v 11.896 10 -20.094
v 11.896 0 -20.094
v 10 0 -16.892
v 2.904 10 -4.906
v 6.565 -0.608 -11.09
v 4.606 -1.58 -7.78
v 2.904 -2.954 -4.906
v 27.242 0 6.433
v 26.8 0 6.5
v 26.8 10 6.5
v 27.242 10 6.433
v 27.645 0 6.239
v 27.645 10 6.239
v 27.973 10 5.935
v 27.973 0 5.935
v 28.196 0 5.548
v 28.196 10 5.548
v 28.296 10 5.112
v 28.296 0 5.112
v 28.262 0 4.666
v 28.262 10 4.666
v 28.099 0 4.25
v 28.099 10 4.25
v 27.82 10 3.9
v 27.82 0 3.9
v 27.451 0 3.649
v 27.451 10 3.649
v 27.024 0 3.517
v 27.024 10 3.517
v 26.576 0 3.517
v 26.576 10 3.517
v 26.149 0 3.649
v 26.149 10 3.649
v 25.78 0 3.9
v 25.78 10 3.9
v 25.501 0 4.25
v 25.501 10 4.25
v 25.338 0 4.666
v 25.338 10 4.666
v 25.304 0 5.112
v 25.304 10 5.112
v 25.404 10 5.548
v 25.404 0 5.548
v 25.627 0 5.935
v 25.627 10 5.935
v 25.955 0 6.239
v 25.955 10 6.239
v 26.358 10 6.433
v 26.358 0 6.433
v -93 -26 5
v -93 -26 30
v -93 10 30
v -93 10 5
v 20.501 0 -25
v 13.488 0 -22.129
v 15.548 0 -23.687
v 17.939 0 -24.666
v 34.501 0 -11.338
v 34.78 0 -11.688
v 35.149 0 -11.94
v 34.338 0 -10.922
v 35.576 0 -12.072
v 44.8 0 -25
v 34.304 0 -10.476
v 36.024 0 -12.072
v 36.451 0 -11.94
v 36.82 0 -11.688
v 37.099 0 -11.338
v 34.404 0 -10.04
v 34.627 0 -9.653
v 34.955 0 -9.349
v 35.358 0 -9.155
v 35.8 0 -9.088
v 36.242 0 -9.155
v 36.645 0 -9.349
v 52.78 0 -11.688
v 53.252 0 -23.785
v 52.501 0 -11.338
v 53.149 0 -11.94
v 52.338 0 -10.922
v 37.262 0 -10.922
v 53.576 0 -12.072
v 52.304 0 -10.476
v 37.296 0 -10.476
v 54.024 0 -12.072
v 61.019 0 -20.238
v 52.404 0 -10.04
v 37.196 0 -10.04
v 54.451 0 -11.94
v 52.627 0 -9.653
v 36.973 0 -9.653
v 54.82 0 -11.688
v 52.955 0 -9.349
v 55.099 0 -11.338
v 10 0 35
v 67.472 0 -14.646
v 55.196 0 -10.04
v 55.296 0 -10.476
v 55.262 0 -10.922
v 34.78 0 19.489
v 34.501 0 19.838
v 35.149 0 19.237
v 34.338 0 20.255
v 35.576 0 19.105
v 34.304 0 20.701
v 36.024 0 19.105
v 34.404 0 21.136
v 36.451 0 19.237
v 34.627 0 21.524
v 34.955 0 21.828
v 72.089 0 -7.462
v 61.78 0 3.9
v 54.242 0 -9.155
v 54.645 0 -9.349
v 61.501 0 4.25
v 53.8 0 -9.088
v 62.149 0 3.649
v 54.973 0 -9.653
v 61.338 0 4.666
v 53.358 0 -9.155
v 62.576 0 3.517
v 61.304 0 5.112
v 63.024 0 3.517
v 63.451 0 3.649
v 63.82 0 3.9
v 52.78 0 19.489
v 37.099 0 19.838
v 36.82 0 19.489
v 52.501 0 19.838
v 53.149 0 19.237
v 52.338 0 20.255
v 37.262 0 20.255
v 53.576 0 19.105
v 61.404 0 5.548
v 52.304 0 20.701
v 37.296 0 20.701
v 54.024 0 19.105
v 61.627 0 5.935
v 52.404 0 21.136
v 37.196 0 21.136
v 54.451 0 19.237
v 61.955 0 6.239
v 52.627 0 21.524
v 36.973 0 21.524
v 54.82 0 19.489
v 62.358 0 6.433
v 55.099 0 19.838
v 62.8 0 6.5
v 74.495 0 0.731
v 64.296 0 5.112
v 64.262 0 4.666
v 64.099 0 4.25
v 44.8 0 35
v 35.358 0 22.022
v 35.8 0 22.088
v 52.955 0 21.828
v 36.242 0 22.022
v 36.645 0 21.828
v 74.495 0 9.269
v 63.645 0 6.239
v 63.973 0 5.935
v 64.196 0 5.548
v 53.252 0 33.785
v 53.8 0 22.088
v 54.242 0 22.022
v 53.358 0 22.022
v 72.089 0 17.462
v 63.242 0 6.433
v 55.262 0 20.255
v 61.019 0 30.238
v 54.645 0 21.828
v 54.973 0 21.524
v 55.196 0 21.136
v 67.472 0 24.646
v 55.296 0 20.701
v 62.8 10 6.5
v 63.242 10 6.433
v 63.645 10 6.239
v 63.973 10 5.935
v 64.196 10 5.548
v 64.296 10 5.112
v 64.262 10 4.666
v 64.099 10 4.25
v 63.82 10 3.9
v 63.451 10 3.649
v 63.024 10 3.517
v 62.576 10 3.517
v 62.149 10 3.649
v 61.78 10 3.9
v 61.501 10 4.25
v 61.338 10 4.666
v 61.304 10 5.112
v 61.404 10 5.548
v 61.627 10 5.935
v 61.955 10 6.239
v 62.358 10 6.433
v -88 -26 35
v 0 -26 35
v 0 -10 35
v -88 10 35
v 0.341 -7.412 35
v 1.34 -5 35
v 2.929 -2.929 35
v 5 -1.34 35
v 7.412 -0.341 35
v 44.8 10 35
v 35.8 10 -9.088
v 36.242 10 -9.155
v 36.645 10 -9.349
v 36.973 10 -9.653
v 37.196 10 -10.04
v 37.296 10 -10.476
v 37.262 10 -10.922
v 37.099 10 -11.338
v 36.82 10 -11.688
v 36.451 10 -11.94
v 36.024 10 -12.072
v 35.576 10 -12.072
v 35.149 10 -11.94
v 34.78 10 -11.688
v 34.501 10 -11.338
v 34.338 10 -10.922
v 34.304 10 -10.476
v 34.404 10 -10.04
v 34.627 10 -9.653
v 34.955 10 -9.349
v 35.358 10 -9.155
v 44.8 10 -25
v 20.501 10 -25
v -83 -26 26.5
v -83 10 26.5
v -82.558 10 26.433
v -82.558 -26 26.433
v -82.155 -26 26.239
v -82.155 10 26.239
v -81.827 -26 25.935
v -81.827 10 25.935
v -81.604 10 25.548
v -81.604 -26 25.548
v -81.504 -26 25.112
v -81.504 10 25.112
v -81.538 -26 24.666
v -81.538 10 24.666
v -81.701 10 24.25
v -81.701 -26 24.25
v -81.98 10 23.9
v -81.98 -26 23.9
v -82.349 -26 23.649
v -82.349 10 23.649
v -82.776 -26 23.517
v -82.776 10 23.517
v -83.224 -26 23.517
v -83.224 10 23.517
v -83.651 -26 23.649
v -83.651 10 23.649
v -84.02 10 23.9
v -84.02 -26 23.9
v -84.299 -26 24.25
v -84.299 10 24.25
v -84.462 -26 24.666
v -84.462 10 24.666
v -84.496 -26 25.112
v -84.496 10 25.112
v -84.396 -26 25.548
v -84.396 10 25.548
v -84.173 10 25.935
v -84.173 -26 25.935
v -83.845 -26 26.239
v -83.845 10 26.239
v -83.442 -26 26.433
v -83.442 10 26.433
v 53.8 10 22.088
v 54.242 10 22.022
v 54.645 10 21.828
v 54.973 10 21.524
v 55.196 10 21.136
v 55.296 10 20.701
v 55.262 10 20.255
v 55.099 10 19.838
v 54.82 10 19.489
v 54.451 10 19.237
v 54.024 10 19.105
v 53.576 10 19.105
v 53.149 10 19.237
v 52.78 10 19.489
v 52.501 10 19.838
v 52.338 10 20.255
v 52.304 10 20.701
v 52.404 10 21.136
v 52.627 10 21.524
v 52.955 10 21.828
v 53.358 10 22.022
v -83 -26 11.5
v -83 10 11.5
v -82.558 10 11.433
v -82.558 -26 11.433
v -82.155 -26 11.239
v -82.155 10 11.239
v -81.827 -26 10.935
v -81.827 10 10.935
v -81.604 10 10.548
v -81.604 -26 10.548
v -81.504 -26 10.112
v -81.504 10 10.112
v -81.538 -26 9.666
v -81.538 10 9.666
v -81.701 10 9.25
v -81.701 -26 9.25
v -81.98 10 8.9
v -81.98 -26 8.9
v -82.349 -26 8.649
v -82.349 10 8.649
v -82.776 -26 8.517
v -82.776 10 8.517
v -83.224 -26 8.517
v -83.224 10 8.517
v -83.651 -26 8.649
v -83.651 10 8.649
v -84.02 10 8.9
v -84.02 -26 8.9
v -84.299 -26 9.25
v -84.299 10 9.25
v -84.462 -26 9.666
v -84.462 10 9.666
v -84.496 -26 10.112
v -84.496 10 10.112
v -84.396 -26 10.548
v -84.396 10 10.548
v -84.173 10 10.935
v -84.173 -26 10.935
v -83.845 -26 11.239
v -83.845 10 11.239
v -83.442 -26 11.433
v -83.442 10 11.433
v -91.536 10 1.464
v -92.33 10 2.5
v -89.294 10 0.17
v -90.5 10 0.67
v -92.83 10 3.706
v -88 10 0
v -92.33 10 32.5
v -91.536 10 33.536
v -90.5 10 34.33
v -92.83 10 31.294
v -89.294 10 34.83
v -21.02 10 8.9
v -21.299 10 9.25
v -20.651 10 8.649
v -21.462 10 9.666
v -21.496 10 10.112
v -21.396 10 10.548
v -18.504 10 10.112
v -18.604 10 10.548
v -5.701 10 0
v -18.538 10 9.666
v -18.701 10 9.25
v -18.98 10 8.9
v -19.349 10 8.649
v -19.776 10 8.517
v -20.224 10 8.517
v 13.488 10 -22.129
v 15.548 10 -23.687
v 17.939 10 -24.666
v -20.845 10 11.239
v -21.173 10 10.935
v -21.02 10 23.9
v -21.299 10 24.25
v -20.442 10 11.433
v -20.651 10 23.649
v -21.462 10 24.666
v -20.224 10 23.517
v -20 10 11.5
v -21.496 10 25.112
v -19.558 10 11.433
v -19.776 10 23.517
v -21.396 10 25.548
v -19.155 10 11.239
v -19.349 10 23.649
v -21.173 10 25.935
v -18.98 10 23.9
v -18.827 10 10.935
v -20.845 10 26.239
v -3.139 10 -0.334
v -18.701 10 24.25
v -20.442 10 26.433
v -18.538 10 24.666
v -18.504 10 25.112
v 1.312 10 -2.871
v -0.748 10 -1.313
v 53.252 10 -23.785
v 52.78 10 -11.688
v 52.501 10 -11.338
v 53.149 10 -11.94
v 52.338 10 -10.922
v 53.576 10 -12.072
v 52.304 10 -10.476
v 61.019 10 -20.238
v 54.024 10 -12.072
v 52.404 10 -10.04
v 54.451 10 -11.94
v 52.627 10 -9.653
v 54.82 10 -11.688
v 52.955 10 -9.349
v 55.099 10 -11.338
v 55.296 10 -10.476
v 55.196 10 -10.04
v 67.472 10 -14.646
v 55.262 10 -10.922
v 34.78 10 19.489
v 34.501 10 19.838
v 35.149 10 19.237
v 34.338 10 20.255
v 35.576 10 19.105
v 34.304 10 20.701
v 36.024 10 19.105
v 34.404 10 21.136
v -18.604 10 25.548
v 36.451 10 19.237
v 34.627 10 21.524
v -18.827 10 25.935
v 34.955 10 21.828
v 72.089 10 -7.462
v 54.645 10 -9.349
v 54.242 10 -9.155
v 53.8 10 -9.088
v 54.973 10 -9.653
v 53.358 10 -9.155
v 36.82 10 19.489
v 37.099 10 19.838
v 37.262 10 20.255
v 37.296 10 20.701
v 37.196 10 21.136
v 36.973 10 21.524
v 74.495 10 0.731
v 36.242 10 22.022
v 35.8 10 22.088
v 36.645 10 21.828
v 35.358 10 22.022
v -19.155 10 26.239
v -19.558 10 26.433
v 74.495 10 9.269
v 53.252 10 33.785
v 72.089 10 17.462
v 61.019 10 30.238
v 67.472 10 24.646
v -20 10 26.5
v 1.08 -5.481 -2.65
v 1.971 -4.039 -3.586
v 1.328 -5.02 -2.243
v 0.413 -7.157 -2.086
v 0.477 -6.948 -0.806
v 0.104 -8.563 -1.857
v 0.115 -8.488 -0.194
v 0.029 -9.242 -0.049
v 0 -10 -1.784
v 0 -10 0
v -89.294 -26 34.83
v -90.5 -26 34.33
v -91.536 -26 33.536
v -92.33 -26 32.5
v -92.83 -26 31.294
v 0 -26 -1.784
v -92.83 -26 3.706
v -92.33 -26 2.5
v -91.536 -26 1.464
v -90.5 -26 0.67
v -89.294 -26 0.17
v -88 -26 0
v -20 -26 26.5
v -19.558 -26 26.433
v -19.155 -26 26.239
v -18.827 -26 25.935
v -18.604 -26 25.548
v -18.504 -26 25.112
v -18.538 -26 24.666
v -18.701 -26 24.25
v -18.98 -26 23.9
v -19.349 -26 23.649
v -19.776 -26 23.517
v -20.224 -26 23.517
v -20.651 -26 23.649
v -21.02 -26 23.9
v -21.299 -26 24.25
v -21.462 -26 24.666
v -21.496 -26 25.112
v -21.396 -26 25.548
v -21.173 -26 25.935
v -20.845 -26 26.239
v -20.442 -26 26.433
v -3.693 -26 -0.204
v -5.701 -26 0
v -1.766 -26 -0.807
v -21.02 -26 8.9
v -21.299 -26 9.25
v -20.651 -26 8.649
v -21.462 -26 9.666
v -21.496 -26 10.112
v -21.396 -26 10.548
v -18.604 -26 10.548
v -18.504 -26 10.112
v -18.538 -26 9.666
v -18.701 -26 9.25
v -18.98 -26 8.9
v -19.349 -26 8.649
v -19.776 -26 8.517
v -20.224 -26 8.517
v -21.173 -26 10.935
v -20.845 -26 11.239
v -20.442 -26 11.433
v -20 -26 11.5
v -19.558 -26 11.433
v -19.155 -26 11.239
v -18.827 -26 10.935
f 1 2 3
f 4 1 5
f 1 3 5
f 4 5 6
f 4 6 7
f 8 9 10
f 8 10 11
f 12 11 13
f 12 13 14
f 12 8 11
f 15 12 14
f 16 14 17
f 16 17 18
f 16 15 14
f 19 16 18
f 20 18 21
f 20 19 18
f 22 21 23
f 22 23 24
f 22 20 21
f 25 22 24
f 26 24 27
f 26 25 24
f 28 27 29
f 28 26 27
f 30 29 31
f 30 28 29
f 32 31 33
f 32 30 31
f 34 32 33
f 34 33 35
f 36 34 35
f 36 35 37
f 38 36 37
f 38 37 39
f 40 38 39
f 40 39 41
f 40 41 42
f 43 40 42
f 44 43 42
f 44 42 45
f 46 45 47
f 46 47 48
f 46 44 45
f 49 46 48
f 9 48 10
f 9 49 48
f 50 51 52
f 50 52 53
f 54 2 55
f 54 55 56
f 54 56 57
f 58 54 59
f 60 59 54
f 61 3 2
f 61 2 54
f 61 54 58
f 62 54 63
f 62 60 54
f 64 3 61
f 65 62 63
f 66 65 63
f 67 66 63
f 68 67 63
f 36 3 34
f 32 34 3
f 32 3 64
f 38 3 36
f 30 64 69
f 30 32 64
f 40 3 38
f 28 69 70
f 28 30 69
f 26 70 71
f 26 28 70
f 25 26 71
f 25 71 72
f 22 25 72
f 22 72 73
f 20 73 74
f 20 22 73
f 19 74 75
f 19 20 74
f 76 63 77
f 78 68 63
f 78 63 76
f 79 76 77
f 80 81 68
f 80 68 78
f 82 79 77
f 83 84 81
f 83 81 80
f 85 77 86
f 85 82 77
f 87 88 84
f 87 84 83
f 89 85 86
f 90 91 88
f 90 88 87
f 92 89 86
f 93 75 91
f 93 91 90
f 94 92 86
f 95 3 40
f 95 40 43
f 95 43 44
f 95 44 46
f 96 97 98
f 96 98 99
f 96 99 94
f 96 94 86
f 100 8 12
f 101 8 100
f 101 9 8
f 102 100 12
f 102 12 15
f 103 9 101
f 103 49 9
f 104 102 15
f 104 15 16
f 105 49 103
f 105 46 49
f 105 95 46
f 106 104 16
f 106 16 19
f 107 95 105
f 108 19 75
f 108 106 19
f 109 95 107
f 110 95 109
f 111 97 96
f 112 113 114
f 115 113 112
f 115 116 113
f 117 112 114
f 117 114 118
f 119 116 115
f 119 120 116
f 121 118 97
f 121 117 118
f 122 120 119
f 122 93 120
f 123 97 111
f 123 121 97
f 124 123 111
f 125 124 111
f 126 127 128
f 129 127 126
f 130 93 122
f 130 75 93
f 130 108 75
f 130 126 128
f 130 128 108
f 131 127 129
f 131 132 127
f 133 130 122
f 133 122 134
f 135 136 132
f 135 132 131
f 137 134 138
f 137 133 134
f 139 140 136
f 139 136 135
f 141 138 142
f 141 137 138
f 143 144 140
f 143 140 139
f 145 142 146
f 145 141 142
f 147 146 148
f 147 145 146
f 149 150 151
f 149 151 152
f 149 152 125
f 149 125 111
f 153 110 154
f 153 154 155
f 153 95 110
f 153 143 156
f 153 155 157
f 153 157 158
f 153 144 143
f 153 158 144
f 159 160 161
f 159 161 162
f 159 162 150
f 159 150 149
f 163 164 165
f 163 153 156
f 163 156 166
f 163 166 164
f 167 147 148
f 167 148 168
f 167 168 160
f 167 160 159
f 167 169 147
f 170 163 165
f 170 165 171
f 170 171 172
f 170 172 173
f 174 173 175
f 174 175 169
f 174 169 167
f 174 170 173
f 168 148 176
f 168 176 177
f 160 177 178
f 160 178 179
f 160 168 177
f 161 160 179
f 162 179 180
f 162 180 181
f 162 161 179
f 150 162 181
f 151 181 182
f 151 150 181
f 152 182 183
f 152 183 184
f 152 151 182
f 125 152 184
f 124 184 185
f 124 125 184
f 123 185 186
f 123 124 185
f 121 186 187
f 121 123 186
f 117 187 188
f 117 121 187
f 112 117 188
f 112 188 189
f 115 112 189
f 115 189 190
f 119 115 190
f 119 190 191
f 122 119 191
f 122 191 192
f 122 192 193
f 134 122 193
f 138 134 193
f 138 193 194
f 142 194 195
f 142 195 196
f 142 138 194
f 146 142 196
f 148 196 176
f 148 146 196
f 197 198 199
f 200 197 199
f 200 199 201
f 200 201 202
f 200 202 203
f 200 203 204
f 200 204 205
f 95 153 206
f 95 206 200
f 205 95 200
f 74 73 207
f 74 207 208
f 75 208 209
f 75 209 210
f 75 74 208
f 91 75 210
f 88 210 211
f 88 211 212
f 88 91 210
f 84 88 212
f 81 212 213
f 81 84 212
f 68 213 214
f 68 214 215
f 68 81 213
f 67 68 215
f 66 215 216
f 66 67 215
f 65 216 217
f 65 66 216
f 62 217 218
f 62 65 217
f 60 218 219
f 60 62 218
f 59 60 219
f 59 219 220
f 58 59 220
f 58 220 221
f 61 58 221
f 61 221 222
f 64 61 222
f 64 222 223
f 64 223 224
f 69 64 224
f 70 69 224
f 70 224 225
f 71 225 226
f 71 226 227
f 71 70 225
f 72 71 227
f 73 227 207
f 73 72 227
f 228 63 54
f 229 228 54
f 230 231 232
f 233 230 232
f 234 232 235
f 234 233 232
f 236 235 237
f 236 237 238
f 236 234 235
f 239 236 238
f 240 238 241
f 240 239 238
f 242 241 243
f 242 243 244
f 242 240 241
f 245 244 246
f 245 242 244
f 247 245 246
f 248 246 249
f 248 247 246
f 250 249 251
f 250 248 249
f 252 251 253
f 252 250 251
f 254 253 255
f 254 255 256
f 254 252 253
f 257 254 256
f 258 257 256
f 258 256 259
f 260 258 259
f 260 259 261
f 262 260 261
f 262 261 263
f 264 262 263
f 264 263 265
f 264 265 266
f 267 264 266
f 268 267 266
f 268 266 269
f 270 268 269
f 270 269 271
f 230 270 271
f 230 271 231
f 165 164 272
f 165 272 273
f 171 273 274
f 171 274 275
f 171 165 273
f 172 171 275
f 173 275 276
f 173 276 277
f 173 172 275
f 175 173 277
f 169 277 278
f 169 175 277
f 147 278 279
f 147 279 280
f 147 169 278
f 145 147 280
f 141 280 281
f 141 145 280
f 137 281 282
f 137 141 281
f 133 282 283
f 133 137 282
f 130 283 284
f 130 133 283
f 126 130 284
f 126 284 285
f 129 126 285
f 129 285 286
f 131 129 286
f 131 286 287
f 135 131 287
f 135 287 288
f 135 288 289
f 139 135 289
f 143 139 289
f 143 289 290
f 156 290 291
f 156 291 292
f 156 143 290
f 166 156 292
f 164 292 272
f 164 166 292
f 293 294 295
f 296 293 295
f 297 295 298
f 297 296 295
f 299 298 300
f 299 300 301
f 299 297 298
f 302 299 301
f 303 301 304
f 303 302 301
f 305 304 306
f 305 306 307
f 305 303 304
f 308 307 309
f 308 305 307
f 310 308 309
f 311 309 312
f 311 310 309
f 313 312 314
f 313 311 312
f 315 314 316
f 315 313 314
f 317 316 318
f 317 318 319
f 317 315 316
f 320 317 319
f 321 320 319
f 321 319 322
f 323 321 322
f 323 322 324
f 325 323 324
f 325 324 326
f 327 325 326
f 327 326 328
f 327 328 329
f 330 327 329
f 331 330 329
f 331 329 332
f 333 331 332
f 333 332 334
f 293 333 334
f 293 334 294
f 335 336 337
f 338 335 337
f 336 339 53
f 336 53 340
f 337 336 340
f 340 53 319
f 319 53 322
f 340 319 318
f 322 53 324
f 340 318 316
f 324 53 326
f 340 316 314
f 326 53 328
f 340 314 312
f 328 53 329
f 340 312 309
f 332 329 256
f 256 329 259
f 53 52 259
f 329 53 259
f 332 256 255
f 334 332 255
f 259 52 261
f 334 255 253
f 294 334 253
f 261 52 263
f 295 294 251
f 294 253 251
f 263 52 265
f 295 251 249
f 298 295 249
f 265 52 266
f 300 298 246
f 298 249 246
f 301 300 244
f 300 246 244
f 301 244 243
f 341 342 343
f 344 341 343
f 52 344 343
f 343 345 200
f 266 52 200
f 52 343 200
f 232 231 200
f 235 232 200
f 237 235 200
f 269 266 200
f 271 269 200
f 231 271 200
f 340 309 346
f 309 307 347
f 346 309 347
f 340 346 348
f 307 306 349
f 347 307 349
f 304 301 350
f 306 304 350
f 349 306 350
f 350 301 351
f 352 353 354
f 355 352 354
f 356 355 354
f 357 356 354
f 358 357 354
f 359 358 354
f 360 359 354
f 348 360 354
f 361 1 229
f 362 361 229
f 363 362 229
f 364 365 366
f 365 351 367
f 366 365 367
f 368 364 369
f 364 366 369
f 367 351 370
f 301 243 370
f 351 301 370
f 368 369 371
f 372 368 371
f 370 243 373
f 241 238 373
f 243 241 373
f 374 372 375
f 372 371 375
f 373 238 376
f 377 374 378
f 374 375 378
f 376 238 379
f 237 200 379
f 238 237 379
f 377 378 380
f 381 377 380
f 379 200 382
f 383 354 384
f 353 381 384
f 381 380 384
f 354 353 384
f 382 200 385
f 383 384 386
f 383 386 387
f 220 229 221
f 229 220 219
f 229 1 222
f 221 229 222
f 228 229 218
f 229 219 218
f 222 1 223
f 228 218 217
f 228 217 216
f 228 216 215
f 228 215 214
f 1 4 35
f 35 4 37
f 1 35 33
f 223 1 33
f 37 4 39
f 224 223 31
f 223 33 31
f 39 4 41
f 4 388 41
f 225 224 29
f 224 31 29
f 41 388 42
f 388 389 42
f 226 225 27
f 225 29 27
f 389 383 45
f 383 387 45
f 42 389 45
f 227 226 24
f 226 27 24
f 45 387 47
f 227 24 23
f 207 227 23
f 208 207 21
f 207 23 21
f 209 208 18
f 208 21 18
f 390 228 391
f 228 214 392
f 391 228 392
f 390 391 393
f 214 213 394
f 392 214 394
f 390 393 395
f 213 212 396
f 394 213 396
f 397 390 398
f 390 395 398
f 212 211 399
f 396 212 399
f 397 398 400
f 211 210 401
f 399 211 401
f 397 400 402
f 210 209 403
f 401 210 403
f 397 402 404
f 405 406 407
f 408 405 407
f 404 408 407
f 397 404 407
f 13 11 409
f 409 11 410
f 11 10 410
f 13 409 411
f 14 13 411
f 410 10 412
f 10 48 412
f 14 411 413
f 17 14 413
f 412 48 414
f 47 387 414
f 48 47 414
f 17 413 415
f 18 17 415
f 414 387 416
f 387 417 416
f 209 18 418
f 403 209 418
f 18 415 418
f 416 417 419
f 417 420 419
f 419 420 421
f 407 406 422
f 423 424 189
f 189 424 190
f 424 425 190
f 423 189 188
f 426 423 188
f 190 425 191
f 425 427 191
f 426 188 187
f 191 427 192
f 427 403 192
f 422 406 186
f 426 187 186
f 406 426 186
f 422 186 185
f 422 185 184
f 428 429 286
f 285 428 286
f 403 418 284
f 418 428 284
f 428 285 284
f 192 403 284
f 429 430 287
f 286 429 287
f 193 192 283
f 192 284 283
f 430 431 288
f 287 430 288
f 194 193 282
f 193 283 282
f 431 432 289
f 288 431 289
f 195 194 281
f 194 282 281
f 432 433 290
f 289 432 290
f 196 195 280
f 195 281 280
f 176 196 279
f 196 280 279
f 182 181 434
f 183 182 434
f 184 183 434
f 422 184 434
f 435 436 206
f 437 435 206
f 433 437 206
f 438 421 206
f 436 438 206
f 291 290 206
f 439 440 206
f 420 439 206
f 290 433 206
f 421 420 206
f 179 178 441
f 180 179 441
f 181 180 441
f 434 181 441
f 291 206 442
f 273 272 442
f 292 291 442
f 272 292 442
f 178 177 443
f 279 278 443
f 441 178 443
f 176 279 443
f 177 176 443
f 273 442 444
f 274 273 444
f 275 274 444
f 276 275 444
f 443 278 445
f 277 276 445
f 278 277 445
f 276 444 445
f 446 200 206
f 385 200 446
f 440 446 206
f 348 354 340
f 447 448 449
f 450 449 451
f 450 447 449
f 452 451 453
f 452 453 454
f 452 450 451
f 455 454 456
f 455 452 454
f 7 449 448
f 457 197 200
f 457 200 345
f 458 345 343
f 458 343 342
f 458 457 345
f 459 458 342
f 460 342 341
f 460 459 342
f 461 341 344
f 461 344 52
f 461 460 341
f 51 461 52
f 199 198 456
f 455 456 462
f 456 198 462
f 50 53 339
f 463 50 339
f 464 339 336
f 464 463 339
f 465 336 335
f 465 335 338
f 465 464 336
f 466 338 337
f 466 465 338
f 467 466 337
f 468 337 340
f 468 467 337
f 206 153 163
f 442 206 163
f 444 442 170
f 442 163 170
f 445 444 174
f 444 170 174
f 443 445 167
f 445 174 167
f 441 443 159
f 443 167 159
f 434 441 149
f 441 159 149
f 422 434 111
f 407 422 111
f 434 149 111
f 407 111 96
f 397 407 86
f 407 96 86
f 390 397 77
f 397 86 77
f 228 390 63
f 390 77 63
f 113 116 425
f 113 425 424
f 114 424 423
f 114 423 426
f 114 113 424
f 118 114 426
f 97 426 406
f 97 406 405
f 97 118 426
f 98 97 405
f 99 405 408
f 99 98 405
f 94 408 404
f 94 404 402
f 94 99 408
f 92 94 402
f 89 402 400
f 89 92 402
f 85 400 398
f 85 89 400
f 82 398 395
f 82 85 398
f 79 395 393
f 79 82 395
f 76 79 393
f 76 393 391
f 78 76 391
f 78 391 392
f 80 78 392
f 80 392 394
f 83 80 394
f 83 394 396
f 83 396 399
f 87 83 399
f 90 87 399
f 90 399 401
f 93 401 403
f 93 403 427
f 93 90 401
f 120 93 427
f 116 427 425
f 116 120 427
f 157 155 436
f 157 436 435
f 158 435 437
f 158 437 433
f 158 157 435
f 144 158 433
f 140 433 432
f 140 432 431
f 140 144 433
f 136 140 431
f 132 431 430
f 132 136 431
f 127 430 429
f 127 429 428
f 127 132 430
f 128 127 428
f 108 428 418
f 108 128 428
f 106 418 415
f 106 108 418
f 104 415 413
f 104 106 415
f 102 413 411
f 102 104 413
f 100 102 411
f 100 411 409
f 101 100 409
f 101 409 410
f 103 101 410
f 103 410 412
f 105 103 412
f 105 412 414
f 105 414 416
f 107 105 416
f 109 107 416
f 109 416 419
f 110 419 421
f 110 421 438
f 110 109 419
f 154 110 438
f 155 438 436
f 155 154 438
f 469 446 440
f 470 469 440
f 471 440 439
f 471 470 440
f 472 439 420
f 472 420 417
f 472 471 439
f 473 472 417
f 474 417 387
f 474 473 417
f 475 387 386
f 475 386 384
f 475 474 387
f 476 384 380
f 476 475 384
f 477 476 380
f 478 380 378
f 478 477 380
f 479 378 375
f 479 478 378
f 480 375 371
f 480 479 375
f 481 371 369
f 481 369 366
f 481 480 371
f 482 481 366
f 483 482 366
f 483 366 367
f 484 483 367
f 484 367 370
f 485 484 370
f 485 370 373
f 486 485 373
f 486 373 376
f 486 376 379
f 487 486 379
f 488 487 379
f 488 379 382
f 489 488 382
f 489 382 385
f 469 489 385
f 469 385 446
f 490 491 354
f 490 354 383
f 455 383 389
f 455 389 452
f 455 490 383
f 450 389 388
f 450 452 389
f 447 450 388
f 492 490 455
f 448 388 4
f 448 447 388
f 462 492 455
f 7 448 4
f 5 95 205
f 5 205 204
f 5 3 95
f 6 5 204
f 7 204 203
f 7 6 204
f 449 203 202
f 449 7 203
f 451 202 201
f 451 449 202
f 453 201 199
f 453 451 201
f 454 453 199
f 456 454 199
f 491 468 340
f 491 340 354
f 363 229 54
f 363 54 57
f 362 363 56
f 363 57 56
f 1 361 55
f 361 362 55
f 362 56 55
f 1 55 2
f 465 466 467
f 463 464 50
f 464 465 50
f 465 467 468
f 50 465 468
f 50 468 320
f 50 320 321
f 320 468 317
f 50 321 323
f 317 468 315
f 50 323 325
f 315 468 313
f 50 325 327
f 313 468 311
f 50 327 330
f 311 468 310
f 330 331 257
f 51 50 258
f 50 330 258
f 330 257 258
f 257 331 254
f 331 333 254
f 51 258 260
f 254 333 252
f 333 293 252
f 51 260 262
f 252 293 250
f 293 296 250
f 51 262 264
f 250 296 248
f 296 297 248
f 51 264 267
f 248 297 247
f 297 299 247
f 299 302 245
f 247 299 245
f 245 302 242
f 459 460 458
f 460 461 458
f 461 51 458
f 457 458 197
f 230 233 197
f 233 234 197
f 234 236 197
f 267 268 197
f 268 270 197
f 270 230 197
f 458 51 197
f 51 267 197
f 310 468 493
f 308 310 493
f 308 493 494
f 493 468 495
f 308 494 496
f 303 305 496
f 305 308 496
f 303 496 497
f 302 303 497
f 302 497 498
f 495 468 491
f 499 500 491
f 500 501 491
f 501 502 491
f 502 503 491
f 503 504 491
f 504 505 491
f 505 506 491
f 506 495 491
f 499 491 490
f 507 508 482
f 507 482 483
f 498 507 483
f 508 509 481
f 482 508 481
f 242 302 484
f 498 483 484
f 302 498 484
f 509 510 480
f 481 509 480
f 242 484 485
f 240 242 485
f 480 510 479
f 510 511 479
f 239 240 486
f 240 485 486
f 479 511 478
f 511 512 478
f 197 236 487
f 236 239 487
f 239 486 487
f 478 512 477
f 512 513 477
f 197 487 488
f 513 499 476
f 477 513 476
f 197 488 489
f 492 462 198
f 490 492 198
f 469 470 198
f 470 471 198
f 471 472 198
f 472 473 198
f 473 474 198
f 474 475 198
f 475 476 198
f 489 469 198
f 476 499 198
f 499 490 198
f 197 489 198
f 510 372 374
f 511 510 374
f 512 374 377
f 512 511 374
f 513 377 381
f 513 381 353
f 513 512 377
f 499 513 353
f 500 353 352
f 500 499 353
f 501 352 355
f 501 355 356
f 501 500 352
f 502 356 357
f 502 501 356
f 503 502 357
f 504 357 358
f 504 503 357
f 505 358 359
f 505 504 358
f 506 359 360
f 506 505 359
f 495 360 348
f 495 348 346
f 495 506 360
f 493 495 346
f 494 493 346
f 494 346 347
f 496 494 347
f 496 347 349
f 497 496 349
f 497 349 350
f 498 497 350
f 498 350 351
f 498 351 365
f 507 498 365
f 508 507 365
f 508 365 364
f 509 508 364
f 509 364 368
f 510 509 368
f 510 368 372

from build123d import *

# Parameters (mm, degrees)
SKETCH1_R           = 1.5
BOSS_EXTRUDE2_DEPTH = 10
BOSS_EXTRUDE3_START = -26
SKETCH1_3_R         = 1.5
BOSS_EXTRUDE3_DEPTH = 26
FILLET1_R           = 10


with BuildPart() as part:
    # Sketch1 → Boss-Extrude2 (new body)
    # profile 1 of 2: a face of its own
    with BuildSketch(Plane(origin=(0, 0, 0), x_dir=(-1, 0, 0), z_dir=(0, 1, 0))):
        with BuildLine():
            Line((0, 35), (-44.8, 35))
            ThreePointArc((-44.8, 35), (-74.8, 5), (-44.8, -25))
            Line((-44.8, -25), (-14.8, -25))
            Line((-14.8, -25), (0, 0))
            Line((0, 0), (0, 35))
        make_face()
        with Locations(Location((-53.8, -10.588457268, 0), (0, 0, 90))):
            Circle(SKETCH1_R, mode=Mode.SUBTRACT)
        with Locations(Location((-35.8, -10.588457268, 0), (0, 0, 90))):
            Circle(SKETCH1_R, mode=Mode.SUBTRACT)
        with Locations(Location((-26.8, 5, 0), (0, 0, 90))):
            Circle(SKETCH1_R, mode=Mode.SUBTRACT)
        with Locations(Location((-35.8, 20.588457268, 0), (0, 0, 90))):
            Circle(SKETCH1_R, mode=Mode.SUBTRACT)
        with Locations(Location((-53.8, 20.588457268, 0), (0, 0, 90))):
            Circle(SKETCH1_R, mode=Mode.SUBTRACT)
        with Locations(Location((-62.8, 5, 0), (0, 0, 90))):
            Circle(SKETCH1_R, mode=Mode.SUBTRACT)
    # profile 2 of 2: a face of its own
    with BuildSketch(Plane(origin=(0, 0, 0), x_dir=(-1, 0, 0), z_dir=(0, 1, 0))):
        with BuildLine():
            ThreePointArc((88, 35), (91.535533906, 33.535533906), (93, 30))
            Line((93, 30), (93, 5))
            ThreePointArc((93, 5), (91.535533906, 1.464466094), (88, 0))
            Line((88, 0), (0, 0))
            Line((0, 0), (0, 35))
            Line((0, 35), (88, 35))
        make_face()
        with Locations(Location((20, 10, 0), (0, 0, 90))):
            Circle(SKETCH1_R, mode=Mode.SUBTRACT)
        with Locations(Location((83, 10, 0), (0, 0, 90))):
            Circle(SKETCH1_R, mode=Mode.SUBTRACT)
        with Locations(Location((83, 25, 0), (0, 0, 90))):
            Circle(SKETCH1_R, mode=Mode.SUBTRACT)
        with Locations(Location((20, 25, 0), (0, 0, 90))):
            Circle(SKETCH1_R, mode=Mode.SUBTRACT)
    extrude(amount=BOSS_EXTRUDE2_DEPTH)

    # Sketch1<3> → Boss-Extrude3 (add)
    with BuildSketch(Plane(origin=(0, 0, 0), x_dir=(-1, 0, 0), z_dir=(0, 1, 0)).offset(BOSS_EXTRUDE3_START)):
        with BuildLine():
            ThreePointArc((88, 35), (91.535533906, 33.535533906), (93, 30))
            Line((93, 30), (93, 5))
            ThreePointArc((93, 5), (91.535533906, 1.464466094), (88, 0))
            Line((88, 0), (0, 0))
            Line((0, 0), (0, 35))
            Line((0, 35), (88, 35))
        make_face()
        with Locations(Location((20, 10, 0), (0, 0, 90))):
            Circle(SKETCH1_3_R, mode=Mode.SUBTRACT)
        with Locations(Location((83, 10, 0), (0, 0, 90))):
            Circle(SKETCH1_3_R, mode=Mode.SUBTRACT)
        with Locations(Location((83, 25, 0), (0, 0, 90))):
            Circle(SKETCH1_3_R, mode=Mode.SUBTRACT)
        with Locations(Location((20, 25, 0), (0, 0, 90))):
            Circle(SKETCH1_3_R, mode=Mode.SUBTRACT)
    extrude(amount=BOSS_EXTRUDE3_DEPTH)

    # Fillet1
    # the kernel refuses this fillet: 10 mm, written as the material it adds along each edge
    with BuildSketch(Plane(origin=(0, 0, -60), x_dir=(0, -1, 0), z_dir=(0, 0, 1))) as fillet1_piece_1_section:
        with BuildLine():
            CenterArc((FILLET1_R, FILLET1_R), FILLET1_R, 180, 90)
            Line((0, FILLET1_R), (-FILLET1_R * 0.02, FILLET1_R))
            Line((-FILLET1_R * 0.02, FILLET1_R), (-FILLET1_R * 0.02, -FILLET1_R * 0.02))
            Line((-FILLET1_R * 0.02, -FILLET1_R * 0.02), (FILLET1_R, -FILLET1_R * 0.02))
            Line((FILLET1_R, -FILLET1_R * 0.02), (FILLET1_R, 0))
        make_face()
    fillet1_piece_1 = extrude(amount=95, mode=Mode.PRIVATE)
    fillet1_piece_1 = split(fillet1_piece_1, bisect_by=Plane(origin=(4.301180518, -1.064725153, 0), z_dir=(0, 0, -1)), keep=Keep.TOP, mode=Mode.PRIVATE)
    fillet1_piece_1 = split(fillet1_piece_1, bisect_by=Plane(origin=(2.708698038, -1.064725153, -4.575503443), z_dir=(0.8605150974154716, 0, 0.509424937669959)), keep=Keep.TOP, mode=Mode.PRIVATE)
    add(fillet1_piece_1)
    with BuildSketch(Plane(origin=(0, 0, 0), x_dir=(0, -1, 0), z_dir=(0, 0, 1))) as fillet1_piece_2_section:
        with BuildLine():
            CenterArc((FILLET1_R, FILLET1_R), FILLET1_R, 180, 90)
            Line((0, FILLET1_R), (-FILLET1_R * 0.02, FILLET1_R))
            Line((-FILLET1_R * 0.02, FILLET1_R), (-FILLET1_R * 0.02, -FILLET1_R * 0.02))
            Line((-FILLET1_R * 0.02, -FILLET1_R * 0.02), (FILLET1_R, -FILLET1_R * 0.02))
            Line((FILLET1_R, -FILLET1_R * 0.02), (FILLET1_R, 0))
        make_face()
    fillet1_piece_2 = extrude(amount=35, mode=Mode.PRIVATE)
    fillet1_piece_2 = split(fillet1_piece_2, bisect_by=Plane(origin=(-7.086614588, -2.262932977, 11.97063275), z_dir=(0.8605150974154716, 0, 0.509424937669959)), keep=Keep.TOP, mode=Mode.PRIVATE)
    add(fillet1_piece_2)
    with BuildSketch(Plane(origin=(0, 0, 0), x_dir=(0, -1, 0), z_dir=(0, 0, 1))) as fillet1_piece_3_section:
        with BuildLine():
            CenterArc((FILLET1_R, FILLET1_R), FILLET1_R, 180, 90)
            Line((0, FILLET1_R), (-FILLET1_R * 0.02, FILLET1_R))
            Line((-FILLET1_R * 0.02, FILLET1_R), (-FILLET1_R * 0.02, -FILLET1_R * 0.02))
            Line((-FILLET1_R * 0.02, -FILLET1_R * 0.02), (FILLET1_R, -FILLET1_R * 0.02))
            Line((FILLET1_R, -FILLET1_R * 0.02), (FILLET1_R, 0))
        make_face()
    fillet1_piece_3 = extrude(amount=35, mode=Mode.PRIVATE)
    fillet1_piece_3 = split(fillet1_piece_3, bisect_by=Plane(origin=(-0.083967584, -4.9, 0.141837136), z_dir=(-0.8605150974154716, 0, -0.509424937669959)), keep=Keep.TOP, mode=Mode.PRIVATE)
    add(fillet1_piece_3)
    with BuildSketch(Plane(origin=(0, -34.205679631, 0), x_dir=(-1, 0, 0), z_dir=(0, 1, 0))) as fillet1_piece_4_section:
        with BuildLine():
            CenterArc((FILLET1_R * 0.570094660516, -FILLET1_R), FILLET1_R, 90, 59.374467281)
            Line((-FILLET1_R * 0.290420436899, -FILLET1_R * 0.49057506233), (-FILLET1_R * 0.307630738848, -FILLET1_R * 0.480386563577))
            Line((-FILLET1_R * 0.307630738848, -FILLET1_R * 0.480386563577), (-FILLET1_R * 0.0114018932103, FILLET1_R * 0.02))
            Line((-FILLET1_R * 0.0114018932103, FILLET1_R * 0.02), (FILLET1_R * 0.570094660516, FILLET1_R * 0.02))
            Line((FILLET1_R * 0.570094660516, FILLET1_R * 0.02), (FILLET1_R * 0.570094660516, 0))
        make_face()
    fillet1_piece_4 = extrude(amount=44.205679631, mode=Mode.PRIVATE)
    fillet1_piece_4 = split(fillet1_piece_4, bisect_by=Plane(origin=(0, -13, -0.363733484), z_dir=(-1, 0, 0)), keep=Keep.TOP, mode=Mode.PRIVATE)
    fillet1_piece_4 = split(fillet1_piece_4, bisect_by=Plane(origin=(-1.77482193, -26, -0.363733484), z_dir=(0, 1, 0)), keep=Keep.TOP, mode=Mode.PRIVATE)
    fillet1_piece_4 = split(fillet1_piece_4, bisect_by=Plane(origin=(-1.77482193, 0, -0.363733484), z_dir=(0, -1, 0)), keep=Keep.TOP, mode=Mode.PRIVATE)
    add(fillet1_piece_4)
    with BuildSketch(Plane(origin=(0, 0, 0), x_dir=(-1, 0, 0), z_dir=(0, 1, 0))) as fillet1_piece_5_section:
        with BuildLine():
            CenterArc((FILLET1_R * 0.570094660516, -FILLET1_R), FILLET1_R, 90, 59.374467281)
            Line((-FILLET1_R * 0.290420436899, -FILLET1_R * 0.49057506233), (-FILLET1_R * 0.307630738848, -FILLET1_R * 0.480386563577))
            Line((-FILLET1_R * 0.307630738848, -FILLET1_R * 0.480386563577), (-FILLET1_R * 0.0114018932103, FILLET1_R * 0.02))
            Line((-FILLET1_R * 0.0114018932103, FILLET1_R * 0.02), (FILLET1_R * 0.570094660516, FILLET1_R * 0.02))
            Line((FILLET1_R * 0.570094660516, FILLET1_R * 0.02), (FILLET1_R * 0.570094660516, 0))
        make_face()
    fillet1_piece_5 = extrude(amount=10, mode=Mode.PRIVATE)
    fillet1_piece_5 = split(fillet1_piece_5, bisect_by=Plane(origin=(0, 5, -0.363733484), z_dir=(-1, 0, 0)), keep=Keep.TOP, mode=Mode.PRIVATE)
    add(fillet1_piece_5)
    with BuildSketch(Plane(origin=(0, 0, 0), x_dir=(-1, 0, 0), z_dir=(0, 1, 0))) as fillet1_piece_6_section:
        with BuildLine():
            CenterArc((FILLET1_R * 0.570094660516, -FILLET1_R), FILLET1_R, 90, 59.374467281)
            Line((-FILLET1_R * 0.290420436899, -FILLET1_R * 0.49057506233), (-FILLET1_R * 0.307630738848, -FILLET1_R * 0.480386563577))
            Line((-FILLET1_R * 0.307630738848, -FILLET1_R * 0.480386563577), (-FILLET1_R * 0.0114018932103, FILLET1_R * 0.02))
            Line((-FILLET1_R * 0.0114018932103, FILLET1_R * 0.02), (FILLET1_R * 0.570094660516, FILLET1_R * 0.02))
            Line((FILLET1_R * 0.570094660516, FILLET1_R * 0.02), (FILLET1_R * 0.570094660516, 0))
        make_face()
    fillet1_piece_6 = extrude(amount=10, mode=Mode.PRIVATE)
    fillet1_piece_6 = split(fillet1_piece_6, bisect_by=Plane(origin=(0, 5, -2.053594733), z_dir=(1, 0, 0)), keep=Keep.TOP, mode=Mode.PRIVATE)
    add(fillet1_piece_6)
    with BuildSketch(Plane(origin=(0, -34.205679631, 0), x_dir=(-1, 0, 0), z_dir=(0, 1, 0))) as fillet1_piece_7a_section:
        with BuildLine():
            CenterArc((FILLET1_R * 0.570094660516, -FILLET1_R), FILLET1_R, 90, 59.374467281)
            Line((-FILLET1_R * 0.290420436899, -FILLET1_R * 0.49057506233), (-FILLET1_R * 0.307630738848, -FILLET1_R * 0.480386563577))
            Line((-FILLET1_R * 0.307630738848, -FILLET1_R * 0.480386563577), (-FILLET1_R * 0.0114018932103, FILLET1_R * 0.02))
            Line((-FILLET1_R * 0.0114018932103, FILLET1_R * 0.02), (FILLET1_R * 0.570094660516, FILLET1_R * 0.02))
            Line((FILLET1_R * 0.570094660516, FILLET1_R * 0.02), (FILLET1_R * 0.570094660516, 0))
        make_face()
    fillet1_piece_7a = extrude(amount=44.205679631, mode=Mode.PRIVATE)
    fillet1_piece_7a = split(fillet1_piece_7a, bisect_by=Plane(origin=(0, -13, -2.053594733), z_dir=(1, 0, 0)), keep=Keep.TOP, mode=Mode.PRIVATE)
    fillet1_piece_7a = split(fillet1_piece_7a, bisect_by=Plane(origin=(1.054652956, -26, -2.053594733), z_dir=(0, 1, 0)), keep=Keep.TOP, mode=Mode.PRIVATE)
    fillet1_piece_7a = split(fillet1_piece_7a, bisect_by=Plane(origin=(1.054652956, 0, -2.053594733), z_dir=(0, -1, 0)), keep=Keep.TOP, mode=Mode.PRIVATE)
    with BuildSketch(Plane(origin=(0, 0, -60), x_dir=(0, -1, 0), z_dir=(0, 0, 1))) as fillet1_piece_7b_section:
        with BuildLine():
            CenterArc((FILLET1_R, FILLET1_R), FILLET1_R, 180, 90)
            Line((0, FILLET1_R), (-FILLET1_R * 0.02, FILLET1_R))
            Line((-FILLET1_R * 0.02, FILLET1_R), (-FILLET1_R * 0.02, -FILLET1_R * 0.02))
            Line((-FILLET1_R * 0.02, -FILLET1_R * 0.02), (FILLET1_R, -FILLET1_R * 0.02))
            Line((FILLET1_R, -FILLET1_R * 0.02), (FILLET1_R, 0))
        make_face()
    fillet1_piece_7b = extrude(amount=95, mode=Mode.PRIVATE)
    fillet1_piece_7b = split(fillet1_piece_7b, bisect_by=Plane(origin=(2.124740403, -2.345898291, 0), z_dir=(0, 0, -1)), keep=Keep.TOP, mode=Mode.PRIVATE)
    fillet1_piece_7b = split(fillet1_piece_7b, bisect_by=Plane(origin=(14.492269712, -2.345898291, -24.480185325), z_dir=(-0.8605150974154716, 0, -0.509424937669959)), keep=Keep.TOP, mode=Mode.PRIVATE)
    fillet1_piece_7 = fillet1_piece_7a & fillet1_piece_7b
    add(fillet1_piece_7)
    # the kernel refuses this fillet: 10 mm, written as the material it takes off along each edge
    with BuildSketch(Plane(origin=(14.8, -34.205679631, -25), x_dir=(-0.5094249376699589, 0, 0.8605150974154715), z_dir=(0, 1, 0))) as fillet1_2_piece_1:
        with BuildLine():
            CenterArc((FILLET1_R * 0.570094660516, FILLET1_R), FILLET1_R, 210.625532719, 59.374467281)
            Line((-FILLET1_R * 0.290420436899, FILLET1_R * 0.49057506233), (-FILLET1_R * 0.307630738848, FILLET1_R * 0.480386563577))
            Line((-FILLET1_R * 0.307630738848, FILLET1_R * 0.480386563577), (-FILLET1_R * 0.0114018932103, -FILLET1_R * 0.02))
            Line((-FILLET1_R * 0.0114018932103, -FILLET1_R * 0.02), (FILLET1_R * 0.570094660516, -FILLET1_R * 0.02))
            Line((FILLET1_R * 0.570094660516, -FILLET1_R * 0.02), (FILLET1_R * 0.570094660516, 0))
        make_face()
    extrude(amount=78.411359262, mode=Mode.SUBTRACT)


solid = part.part
